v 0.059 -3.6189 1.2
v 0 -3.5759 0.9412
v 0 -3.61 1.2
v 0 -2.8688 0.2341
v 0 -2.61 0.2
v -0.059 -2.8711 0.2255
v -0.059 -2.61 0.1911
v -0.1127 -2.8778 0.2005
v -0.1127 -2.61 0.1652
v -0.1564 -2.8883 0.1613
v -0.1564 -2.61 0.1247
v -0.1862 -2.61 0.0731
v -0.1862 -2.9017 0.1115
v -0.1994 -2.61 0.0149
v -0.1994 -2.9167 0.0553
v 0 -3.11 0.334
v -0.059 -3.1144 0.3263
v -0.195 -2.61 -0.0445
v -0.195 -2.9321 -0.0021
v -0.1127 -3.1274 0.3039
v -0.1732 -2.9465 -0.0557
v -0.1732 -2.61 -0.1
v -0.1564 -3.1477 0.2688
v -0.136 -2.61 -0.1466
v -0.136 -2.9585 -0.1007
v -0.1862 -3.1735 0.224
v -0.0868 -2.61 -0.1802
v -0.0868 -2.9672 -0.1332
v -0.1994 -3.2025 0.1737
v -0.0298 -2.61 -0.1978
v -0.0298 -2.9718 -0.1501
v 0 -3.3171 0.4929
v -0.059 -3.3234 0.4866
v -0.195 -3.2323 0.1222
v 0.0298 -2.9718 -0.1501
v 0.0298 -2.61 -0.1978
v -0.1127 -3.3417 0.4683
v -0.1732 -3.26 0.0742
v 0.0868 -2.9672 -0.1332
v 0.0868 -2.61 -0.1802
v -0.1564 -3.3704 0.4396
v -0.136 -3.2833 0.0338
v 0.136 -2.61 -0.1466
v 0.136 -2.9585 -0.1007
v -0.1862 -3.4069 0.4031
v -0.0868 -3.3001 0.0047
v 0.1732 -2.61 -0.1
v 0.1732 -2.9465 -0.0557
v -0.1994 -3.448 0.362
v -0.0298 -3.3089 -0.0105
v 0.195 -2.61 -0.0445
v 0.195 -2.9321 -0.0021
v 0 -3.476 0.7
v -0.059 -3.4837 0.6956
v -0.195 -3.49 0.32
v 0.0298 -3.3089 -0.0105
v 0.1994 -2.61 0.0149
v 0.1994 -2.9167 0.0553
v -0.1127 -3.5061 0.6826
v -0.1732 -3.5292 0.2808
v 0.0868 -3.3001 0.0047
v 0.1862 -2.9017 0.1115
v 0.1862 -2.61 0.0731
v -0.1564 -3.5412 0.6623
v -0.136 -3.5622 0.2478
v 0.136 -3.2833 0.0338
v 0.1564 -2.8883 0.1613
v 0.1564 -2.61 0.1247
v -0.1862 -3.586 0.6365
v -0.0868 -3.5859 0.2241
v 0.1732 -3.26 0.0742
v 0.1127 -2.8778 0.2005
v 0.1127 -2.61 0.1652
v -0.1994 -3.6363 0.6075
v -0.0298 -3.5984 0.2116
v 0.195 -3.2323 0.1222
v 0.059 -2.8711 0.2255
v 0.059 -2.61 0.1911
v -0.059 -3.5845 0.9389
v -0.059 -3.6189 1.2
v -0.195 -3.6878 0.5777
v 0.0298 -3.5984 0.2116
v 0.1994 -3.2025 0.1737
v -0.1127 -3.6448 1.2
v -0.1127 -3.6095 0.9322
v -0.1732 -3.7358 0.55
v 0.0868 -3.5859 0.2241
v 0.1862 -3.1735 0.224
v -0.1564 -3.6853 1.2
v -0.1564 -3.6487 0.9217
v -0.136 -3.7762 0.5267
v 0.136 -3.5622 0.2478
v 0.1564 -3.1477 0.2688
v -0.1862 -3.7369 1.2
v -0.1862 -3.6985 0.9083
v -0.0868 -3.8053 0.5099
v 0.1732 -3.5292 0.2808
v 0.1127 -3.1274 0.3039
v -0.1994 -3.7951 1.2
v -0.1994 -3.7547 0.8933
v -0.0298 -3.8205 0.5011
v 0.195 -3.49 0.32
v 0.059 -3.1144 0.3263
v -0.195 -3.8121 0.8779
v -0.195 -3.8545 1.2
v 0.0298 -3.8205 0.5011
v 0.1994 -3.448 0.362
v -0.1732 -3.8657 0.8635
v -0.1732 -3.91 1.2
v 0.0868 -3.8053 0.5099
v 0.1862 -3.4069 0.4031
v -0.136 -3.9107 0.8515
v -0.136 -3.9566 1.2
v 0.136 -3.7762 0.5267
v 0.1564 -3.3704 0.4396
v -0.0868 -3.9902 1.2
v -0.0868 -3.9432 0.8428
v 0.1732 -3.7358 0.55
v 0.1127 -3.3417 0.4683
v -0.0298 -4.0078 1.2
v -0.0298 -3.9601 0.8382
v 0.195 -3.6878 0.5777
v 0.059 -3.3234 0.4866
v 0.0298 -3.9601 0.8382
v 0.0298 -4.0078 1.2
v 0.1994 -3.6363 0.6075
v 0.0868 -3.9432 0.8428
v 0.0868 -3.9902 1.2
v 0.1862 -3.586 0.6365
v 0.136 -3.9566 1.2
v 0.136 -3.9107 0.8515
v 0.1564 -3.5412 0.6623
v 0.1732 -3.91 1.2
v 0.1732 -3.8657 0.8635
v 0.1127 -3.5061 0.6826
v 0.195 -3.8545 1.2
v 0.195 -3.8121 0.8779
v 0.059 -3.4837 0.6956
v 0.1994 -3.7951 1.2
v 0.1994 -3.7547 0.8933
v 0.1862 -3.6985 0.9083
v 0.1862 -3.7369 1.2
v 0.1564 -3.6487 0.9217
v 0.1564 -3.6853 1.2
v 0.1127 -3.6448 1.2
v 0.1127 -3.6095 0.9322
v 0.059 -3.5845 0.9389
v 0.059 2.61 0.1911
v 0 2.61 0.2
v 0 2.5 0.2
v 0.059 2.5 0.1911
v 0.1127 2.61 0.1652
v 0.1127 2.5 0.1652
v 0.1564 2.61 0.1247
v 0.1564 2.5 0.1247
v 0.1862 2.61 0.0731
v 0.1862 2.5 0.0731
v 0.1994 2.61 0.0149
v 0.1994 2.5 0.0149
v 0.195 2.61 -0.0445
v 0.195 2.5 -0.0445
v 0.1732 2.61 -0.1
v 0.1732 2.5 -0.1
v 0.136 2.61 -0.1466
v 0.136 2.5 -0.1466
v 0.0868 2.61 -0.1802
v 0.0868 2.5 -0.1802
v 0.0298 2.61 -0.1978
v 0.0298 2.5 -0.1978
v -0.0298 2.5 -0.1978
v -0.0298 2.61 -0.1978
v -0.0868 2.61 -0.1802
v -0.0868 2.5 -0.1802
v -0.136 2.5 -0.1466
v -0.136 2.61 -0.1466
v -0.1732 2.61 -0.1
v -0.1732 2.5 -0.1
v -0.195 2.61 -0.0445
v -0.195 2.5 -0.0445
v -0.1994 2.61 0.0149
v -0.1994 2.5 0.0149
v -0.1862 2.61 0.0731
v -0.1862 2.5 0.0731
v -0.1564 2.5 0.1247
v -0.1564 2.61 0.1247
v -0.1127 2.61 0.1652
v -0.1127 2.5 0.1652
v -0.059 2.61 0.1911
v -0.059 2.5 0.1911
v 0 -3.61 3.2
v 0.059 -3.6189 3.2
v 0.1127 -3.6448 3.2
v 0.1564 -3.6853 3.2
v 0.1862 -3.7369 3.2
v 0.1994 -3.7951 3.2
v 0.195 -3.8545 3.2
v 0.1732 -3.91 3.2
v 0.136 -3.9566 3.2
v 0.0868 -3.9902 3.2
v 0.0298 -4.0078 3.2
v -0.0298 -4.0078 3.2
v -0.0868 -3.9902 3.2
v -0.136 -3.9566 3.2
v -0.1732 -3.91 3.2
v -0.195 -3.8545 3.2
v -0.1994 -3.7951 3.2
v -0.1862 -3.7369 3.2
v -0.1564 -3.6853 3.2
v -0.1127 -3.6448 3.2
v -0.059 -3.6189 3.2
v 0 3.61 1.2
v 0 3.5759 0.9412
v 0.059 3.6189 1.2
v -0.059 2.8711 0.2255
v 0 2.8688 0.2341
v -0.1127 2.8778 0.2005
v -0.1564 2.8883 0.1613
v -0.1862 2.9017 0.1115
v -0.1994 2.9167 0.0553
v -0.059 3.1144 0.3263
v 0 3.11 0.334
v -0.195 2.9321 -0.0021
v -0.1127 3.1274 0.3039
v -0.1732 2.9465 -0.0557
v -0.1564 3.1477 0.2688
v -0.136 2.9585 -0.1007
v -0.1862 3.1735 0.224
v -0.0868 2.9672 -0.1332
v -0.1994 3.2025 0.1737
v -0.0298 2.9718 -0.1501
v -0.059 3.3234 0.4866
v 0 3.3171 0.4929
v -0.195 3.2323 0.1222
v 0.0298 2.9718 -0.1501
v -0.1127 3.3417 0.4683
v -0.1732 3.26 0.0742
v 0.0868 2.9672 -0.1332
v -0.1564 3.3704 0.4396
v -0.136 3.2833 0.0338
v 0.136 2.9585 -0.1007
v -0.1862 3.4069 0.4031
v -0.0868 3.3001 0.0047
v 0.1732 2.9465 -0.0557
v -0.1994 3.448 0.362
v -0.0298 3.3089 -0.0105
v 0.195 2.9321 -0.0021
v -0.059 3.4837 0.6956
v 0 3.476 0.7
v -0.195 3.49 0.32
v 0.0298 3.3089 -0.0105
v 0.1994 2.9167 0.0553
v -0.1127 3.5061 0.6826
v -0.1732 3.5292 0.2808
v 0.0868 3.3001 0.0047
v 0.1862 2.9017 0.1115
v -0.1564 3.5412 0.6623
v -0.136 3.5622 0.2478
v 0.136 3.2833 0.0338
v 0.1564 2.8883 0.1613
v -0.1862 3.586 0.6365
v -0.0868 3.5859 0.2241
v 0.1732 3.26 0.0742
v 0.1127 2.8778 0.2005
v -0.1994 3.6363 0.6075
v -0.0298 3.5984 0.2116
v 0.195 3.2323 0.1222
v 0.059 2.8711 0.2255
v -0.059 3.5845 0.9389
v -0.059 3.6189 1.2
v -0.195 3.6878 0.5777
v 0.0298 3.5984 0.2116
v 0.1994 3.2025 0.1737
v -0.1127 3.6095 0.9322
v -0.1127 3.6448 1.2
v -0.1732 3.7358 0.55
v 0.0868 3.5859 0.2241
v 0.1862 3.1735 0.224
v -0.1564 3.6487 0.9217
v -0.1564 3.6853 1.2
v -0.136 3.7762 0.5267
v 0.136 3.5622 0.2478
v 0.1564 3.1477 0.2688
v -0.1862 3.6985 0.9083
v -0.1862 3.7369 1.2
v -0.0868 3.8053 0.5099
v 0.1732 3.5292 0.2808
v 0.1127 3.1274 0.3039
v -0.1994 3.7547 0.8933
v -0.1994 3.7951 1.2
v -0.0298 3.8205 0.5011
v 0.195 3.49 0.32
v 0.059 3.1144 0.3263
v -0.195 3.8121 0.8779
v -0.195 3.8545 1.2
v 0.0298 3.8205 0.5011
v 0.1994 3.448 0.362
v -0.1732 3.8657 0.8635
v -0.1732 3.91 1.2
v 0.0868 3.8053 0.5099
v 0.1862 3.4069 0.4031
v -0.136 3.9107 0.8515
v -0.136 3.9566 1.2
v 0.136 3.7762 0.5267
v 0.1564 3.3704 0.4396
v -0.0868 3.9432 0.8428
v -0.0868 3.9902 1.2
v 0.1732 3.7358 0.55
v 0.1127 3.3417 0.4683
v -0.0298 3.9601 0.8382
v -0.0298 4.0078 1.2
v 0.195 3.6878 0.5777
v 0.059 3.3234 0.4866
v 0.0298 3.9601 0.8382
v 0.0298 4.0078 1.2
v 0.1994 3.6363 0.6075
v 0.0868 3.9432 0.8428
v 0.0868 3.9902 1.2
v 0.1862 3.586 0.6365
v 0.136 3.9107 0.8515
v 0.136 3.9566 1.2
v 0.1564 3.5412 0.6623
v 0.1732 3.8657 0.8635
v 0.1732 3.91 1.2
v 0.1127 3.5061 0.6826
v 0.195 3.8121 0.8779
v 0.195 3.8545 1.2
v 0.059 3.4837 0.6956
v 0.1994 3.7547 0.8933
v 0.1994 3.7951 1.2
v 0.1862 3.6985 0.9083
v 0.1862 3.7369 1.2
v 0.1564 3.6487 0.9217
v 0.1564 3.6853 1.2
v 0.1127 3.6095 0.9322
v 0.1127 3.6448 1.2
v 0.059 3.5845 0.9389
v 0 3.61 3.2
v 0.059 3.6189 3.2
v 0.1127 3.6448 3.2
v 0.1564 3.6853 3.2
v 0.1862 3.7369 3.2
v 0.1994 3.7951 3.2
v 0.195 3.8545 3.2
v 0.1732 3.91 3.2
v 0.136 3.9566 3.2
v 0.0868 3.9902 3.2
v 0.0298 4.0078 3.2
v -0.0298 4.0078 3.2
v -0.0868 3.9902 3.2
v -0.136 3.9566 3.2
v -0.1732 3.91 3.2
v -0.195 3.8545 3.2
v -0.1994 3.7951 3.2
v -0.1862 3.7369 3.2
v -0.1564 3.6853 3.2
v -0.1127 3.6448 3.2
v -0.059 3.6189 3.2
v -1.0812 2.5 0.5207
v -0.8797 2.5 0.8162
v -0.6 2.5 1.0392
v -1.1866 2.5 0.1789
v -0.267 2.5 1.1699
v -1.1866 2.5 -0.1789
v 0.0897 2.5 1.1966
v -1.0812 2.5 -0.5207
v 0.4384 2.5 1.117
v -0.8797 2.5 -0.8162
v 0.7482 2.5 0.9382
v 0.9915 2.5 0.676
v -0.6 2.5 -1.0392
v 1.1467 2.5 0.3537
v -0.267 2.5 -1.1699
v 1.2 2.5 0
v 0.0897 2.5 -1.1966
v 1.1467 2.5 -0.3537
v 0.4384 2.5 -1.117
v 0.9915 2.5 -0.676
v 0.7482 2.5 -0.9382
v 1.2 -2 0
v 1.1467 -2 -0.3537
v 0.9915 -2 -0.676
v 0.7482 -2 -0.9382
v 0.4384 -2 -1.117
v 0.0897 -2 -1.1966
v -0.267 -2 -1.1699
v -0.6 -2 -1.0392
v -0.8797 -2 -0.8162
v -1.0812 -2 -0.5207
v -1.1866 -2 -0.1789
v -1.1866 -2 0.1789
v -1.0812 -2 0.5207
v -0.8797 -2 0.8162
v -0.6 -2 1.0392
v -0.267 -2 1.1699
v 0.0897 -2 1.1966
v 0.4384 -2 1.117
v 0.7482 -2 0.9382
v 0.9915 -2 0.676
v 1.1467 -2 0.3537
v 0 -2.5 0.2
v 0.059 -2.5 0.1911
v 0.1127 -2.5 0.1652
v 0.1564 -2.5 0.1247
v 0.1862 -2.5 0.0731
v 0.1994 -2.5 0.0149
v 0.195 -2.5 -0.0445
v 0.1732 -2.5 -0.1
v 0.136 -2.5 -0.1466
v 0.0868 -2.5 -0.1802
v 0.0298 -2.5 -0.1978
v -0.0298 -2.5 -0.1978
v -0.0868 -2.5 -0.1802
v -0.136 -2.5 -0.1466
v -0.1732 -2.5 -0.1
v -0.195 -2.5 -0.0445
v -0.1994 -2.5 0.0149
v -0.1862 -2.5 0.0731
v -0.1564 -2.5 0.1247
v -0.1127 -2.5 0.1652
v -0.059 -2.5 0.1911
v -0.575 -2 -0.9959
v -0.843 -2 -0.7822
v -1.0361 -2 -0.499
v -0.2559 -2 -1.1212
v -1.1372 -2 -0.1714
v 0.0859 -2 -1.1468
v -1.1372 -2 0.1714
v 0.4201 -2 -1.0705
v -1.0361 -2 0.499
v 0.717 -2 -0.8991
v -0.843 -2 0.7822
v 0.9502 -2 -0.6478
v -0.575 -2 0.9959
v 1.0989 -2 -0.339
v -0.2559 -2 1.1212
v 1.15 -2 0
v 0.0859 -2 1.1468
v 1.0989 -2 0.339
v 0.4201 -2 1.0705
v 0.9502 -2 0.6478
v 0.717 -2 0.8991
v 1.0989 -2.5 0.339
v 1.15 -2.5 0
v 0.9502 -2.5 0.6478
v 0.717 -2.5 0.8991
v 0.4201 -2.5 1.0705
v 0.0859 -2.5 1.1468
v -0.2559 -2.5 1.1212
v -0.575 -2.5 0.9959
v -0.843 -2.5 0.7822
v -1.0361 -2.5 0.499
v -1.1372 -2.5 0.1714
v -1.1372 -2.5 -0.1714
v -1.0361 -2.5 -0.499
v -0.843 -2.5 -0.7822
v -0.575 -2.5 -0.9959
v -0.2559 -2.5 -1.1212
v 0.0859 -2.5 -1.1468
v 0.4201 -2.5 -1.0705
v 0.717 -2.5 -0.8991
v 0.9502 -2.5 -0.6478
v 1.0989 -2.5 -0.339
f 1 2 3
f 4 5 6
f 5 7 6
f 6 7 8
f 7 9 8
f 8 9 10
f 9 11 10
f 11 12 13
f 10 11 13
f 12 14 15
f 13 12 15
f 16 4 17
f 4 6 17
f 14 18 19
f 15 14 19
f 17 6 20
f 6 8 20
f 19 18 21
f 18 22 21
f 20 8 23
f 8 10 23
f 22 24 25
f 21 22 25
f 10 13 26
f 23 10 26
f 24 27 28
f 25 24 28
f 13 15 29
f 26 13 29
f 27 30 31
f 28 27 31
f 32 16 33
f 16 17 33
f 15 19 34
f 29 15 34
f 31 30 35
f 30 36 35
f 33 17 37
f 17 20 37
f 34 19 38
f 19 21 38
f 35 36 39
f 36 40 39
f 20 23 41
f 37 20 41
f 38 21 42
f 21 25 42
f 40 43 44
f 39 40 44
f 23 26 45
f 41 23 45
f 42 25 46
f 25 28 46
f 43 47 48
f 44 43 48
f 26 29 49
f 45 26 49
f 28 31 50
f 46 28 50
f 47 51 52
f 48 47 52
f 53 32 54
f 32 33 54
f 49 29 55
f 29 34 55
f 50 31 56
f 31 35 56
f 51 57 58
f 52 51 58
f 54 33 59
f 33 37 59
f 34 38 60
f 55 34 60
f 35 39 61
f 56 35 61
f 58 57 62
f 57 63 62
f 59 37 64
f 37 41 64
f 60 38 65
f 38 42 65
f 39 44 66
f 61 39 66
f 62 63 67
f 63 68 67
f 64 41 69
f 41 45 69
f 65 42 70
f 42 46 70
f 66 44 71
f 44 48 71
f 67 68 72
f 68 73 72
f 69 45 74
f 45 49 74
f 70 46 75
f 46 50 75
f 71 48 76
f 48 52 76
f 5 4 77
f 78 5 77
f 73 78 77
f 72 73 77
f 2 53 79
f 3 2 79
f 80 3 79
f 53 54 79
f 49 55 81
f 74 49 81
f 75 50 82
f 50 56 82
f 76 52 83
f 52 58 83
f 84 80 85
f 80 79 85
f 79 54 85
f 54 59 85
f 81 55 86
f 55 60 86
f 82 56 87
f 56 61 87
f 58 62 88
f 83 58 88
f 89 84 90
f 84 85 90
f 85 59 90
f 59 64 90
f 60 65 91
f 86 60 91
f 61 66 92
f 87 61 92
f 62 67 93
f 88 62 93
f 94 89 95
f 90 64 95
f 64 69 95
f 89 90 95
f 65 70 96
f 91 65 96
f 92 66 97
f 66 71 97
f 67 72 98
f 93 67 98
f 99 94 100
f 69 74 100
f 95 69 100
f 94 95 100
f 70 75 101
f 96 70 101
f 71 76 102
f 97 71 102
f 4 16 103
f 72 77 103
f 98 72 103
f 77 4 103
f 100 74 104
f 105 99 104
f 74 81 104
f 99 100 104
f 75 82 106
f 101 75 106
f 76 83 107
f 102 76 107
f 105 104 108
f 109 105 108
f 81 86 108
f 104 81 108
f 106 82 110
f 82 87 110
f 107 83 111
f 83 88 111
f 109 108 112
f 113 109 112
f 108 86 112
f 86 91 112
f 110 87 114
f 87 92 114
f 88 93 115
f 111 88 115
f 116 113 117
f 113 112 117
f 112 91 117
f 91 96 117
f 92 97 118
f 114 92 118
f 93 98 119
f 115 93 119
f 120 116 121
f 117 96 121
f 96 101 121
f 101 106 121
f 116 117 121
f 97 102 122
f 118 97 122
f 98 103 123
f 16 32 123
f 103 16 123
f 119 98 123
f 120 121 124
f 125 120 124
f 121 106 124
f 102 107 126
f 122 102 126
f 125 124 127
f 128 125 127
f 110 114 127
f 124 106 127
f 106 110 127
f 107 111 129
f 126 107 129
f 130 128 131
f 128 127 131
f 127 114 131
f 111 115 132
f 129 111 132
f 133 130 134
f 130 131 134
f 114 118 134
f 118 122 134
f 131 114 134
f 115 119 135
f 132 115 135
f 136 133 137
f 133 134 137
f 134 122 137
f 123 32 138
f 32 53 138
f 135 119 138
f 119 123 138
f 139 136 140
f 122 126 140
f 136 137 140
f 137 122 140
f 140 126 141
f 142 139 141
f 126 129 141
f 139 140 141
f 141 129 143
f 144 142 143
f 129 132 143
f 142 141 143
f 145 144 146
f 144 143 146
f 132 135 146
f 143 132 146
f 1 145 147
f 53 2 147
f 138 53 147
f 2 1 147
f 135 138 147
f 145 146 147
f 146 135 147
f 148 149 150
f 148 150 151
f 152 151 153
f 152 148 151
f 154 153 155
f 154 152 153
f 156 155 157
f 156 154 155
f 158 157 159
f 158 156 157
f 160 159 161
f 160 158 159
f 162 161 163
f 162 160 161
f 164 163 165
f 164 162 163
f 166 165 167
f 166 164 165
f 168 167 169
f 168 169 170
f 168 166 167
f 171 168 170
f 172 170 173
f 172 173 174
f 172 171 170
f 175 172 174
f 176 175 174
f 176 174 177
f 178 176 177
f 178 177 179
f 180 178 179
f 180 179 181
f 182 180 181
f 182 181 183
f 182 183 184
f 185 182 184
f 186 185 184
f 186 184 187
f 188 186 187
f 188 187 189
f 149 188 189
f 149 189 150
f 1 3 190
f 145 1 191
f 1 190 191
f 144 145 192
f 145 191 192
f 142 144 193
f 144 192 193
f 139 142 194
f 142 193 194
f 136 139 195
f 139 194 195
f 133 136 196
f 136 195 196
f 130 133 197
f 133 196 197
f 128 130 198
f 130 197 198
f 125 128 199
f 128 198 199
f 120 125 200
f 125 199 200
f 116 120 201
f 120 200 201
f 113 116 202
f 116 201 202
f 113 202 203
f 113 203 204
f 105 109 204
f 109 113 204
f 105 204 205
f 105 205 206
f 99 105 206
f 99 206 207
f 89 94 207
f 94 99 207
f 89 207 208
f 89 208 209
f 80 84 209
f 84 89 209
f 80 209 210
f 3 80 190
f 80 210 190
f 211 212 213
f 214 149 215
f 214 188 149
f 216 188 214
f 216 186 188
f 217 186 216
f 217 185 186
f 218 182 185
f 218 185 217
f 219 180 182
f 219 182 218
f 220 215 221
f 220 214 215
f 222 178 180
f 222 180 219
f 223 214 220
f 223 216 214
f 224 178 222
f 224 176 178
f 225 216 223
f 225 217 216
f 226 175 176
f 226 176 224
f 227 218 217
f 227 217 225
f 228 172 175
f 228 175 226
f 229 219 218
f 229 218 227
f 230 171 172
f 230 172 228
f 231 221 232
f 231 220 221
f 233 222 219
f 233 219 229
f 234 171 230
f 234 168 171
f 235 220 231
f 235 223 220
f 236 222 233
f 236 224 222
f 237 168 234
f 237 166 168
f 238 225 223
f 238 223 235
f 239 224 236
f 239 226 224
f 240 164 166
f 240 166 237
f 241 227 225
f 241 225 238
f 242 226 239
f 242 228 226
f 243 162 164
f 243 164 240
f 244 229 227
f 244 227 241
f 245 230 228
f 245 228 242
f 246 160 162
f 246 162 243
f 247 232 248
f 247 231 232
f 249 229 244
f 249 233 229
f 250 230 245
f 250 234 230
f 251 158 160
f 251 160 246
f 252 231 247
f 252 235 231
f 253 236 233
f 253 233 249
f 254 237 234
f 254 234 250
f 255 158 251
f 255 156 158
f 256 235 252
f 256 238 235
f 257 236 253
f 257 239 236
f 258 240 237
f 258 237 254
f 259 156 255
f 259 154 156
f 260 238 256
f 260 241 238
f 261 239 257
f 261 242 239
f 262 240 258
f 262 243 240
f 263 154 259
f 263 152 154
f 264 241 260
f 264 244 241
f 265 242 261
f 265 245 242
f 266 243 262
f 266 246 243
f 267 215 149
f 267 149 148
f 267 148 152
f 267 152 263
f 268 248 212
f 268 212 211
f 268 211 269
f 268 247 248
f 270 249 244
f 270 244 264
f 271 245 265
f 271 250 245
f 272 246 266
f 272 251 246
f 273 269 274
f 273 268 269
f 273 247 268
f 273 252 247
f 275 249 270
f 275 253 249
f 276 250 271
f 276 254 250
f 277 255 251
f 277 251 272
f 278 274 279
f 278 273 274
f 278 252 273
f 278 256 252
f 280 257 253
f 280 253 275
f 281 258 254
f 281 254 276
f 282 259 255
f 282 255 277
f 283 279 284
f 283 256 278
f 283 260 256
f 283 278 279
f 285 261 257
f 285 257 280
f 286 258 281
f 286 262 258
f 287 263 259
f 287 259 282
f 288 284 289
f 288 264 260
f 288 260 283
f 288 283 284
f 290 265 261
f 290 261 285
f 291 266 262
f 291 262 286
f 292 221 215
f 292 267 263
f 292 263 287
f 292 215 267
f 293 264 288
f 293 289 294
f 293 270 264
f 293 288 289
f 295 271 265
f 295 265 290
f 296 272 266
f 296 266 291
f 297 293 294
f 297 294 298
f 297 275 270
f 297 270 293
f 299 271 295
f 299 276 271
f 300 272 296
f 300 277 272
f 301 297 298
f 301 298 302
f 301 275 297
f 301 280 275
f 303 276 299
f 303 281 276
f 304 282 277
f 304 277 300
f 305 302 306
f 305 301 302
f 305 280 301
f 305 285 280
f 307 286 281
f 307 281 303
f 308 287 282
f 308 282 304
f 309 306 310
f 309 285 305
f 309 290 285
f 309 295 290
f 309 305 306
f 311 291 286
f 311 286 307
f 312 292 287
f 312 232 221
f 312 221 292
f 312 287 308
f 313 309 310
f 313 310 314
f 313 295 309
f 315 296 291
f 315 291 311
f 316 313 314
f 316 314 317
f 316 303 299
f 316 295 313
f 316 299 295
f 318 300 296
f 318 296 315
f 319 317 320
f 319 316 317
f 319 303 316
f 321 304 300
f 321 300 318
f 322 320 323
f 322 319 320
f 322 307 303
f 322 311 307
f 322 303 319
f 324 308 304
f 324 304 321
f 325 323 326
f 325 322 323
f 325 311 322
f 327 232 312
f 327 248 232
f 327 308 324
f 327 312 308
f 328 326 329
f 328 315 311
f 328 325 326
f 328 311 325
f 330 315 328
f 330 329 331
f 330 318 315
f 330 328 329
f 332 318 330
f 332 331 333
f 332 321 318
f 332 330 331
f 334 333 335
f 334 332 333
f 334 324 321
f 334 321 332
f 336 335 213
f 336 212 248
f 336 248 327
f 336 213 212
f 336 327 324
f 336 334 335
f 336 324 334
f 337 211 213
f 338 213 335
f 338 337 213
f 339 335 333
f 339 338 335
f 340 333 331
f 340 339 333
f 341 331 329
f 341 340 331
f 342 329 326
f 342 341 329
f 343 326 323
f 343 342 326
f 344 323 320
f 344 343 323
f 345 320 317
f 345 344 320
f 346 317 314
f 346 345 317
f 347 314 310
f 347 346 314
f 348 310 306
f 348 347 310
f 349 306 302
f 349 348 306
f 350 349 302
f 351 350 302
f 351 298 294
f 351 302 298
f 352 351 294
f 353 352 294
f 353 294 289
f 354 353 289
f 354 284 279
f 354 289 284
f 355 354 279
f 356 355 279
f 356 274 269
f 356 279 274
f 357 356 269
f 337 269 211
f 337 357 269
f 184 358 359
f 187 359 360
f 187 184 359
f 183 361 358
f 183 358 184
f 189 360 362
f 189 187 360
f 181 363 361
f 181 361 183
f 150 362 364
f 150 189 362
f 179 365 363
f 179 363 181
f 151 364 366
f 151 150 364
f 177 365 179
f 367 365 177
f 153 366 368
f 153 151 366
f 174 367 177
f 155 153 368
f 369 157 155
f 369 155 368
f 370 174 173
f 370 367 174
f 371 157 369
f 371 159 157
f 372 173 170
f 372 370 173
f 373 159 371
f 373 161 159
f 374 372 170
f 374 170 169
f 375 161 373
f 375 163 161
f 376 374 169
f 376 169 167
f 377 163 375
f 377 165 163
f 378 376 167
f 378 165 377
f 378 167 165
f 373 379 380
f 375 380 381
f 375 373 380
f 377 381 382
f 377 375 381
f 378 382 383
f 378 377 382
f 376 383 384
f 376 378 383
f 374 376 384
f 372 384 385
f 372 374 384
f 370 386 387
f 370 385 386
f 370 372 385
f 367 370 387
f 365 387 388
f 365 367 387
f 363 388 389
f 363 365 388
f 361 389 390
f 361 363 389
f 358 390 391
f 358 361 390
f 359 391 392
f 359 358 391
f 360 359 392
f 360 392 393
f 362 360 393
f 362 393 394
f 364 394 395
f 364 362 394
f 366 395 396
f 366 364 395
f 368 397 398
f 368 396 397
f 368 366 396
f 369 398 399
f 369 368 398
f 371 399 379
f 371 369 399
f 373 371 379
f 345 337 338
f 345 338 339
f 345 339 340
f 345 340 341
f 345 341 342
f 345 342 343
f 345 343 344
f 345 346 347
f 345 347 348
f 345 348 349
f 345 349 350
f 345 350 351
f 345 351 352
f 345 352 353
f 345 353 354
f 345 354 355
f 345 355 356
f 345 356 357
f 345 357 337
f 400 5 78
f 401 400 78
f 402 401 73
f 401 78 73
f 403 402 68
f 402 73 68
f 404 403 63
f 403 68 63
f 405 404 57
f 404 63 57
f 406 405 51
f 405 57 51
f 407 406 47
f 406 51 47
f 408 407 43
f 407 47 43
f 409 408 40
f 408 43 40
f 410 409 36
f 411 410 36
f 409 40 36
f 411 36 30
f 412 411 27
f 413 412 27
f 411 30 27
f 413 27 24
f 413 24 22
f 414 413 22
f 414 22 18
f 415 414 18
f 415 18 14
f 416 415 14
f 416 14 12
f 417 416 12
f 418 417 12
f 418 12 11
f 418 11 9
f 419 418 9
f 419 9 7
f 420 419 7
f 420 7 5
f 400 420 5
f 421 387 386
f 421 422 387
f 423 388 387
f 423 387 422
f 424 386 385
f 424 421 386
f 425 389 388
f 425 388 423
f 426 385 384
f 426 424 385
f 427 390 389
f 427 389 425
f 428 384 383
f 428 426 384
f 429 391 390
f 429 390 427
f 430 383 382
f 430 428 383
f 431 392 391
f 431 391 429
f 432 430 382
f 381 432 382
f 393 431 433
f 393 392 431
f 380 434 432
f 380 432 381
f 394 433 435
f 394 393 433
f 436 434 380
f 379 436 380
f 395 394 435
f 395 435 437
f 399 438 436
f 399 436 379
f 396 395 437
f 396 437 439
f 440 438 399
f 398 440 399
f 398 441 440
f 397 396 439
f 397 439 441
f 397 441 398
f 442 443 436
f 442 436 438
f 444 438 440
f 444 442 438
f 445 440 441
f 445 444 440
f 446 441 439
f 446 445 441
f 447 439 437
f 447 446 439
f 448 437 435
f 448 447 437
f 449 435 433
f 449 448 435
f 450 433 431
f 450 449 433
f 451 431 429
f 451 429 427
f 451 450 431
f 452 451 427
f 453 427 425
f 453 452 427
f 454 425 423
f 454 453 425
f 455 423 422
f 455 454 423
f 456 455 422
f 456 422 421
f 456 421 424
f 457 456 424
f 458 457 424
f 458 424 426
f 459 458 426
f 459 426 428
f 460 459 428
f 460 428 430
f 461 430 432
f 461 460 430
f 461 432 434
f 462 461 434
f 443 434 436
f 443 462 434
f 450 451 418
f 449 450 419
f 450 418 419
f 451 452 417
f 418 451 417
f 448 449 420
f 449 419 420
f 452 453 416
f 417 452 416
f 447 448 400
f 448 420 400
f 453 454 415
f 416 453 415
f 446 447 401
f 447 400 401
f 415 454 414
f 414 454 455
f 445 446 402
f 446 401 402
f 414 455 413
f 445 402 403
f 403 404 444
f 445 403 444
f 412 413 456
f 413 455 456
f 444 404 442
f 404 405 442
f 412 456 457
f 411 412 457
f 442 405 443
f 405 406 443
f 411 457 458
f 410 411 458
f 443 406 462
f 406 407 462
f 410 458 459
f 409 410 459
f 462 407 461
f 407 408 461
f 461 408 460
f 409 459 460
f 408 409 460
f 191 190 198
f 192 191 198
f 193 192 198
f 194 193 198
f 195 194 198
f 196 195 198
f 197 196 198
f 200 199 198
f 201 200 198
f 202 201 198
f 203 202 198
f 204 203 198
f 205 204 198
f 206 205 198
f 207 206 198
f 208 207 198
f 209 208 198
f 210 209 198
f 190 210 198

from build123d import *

# Parameters (mm, degrees)
BOSS_EXTRUDE1_DEPTH      = 2.5
BOSS_EXTRUDE1_DEPTH_BACK = 2.5
SKETCH2_R                = 1.2
SWEEP1_PROFILE_R         = 0.2
SKETCH23_R               = 1.2
SKETCH23_R_2             = 1.15
CUT_EXTRUDE1_DEPTH       = 0.5


with BuildPart() as part:
    # Sketch2 → Boss-Extrude1 (new, two sides: drawn at the far end of the back side and taken through both)
    with BuildSketch(Plane(origin=(0, 0, 0), x_dir=(1, 0, 0), z_dir=(0, 1, 0)).offset(-BOSS_EXTRUDE1_DEPTH_BACK)):
        Circle(SKETCH2_R)
    extrude(amount=BOSS_EXTRUDE1_DEPTH + BOSS_EXTRUDE1_DEPTH_BACK)

    # Sweep1: sweep along a path in Sketch3
    with BuildLine(Plane(origin=(0, 0, 0), x_dir=(0, 0, -1), z_dir=(1, 0, 0))) as sweep1_path:
        Line((0, 2.5), (0, 2.61))
        ThreePointArc((0, 2.61), (-0.351471863, 3.458528137), (-1.2, 3.81))
        Line((-1.2, 3.81), (-3.2, 3.81))
    # Sweep1 profile (on start of the path) → Sweep1 (sweep)
    with BuildSketch(Plane.ZX.offset(2.5)):
        Circle(SWEEP1_PROFILE_R)
    sweep1 = sweep(path=sweep1_path.line)

    # Mirror1: Sweep1 across plane
    add(sweep1.mirror(Plane.ZX))

    # Sketch23 → Cut-Extrude1 (cut)
    with BuildSketch(Plane.XZ.offset(2.5)):
        Circle(SKETCH23_R)
        Circle(SKETCH23_R_2, mode=Mode.SUBTRACT)
    extrude(amount=-CUT_EXTRUDE1_DEPTH, mode=Mode.SUBTRACT)


solid = part.part
